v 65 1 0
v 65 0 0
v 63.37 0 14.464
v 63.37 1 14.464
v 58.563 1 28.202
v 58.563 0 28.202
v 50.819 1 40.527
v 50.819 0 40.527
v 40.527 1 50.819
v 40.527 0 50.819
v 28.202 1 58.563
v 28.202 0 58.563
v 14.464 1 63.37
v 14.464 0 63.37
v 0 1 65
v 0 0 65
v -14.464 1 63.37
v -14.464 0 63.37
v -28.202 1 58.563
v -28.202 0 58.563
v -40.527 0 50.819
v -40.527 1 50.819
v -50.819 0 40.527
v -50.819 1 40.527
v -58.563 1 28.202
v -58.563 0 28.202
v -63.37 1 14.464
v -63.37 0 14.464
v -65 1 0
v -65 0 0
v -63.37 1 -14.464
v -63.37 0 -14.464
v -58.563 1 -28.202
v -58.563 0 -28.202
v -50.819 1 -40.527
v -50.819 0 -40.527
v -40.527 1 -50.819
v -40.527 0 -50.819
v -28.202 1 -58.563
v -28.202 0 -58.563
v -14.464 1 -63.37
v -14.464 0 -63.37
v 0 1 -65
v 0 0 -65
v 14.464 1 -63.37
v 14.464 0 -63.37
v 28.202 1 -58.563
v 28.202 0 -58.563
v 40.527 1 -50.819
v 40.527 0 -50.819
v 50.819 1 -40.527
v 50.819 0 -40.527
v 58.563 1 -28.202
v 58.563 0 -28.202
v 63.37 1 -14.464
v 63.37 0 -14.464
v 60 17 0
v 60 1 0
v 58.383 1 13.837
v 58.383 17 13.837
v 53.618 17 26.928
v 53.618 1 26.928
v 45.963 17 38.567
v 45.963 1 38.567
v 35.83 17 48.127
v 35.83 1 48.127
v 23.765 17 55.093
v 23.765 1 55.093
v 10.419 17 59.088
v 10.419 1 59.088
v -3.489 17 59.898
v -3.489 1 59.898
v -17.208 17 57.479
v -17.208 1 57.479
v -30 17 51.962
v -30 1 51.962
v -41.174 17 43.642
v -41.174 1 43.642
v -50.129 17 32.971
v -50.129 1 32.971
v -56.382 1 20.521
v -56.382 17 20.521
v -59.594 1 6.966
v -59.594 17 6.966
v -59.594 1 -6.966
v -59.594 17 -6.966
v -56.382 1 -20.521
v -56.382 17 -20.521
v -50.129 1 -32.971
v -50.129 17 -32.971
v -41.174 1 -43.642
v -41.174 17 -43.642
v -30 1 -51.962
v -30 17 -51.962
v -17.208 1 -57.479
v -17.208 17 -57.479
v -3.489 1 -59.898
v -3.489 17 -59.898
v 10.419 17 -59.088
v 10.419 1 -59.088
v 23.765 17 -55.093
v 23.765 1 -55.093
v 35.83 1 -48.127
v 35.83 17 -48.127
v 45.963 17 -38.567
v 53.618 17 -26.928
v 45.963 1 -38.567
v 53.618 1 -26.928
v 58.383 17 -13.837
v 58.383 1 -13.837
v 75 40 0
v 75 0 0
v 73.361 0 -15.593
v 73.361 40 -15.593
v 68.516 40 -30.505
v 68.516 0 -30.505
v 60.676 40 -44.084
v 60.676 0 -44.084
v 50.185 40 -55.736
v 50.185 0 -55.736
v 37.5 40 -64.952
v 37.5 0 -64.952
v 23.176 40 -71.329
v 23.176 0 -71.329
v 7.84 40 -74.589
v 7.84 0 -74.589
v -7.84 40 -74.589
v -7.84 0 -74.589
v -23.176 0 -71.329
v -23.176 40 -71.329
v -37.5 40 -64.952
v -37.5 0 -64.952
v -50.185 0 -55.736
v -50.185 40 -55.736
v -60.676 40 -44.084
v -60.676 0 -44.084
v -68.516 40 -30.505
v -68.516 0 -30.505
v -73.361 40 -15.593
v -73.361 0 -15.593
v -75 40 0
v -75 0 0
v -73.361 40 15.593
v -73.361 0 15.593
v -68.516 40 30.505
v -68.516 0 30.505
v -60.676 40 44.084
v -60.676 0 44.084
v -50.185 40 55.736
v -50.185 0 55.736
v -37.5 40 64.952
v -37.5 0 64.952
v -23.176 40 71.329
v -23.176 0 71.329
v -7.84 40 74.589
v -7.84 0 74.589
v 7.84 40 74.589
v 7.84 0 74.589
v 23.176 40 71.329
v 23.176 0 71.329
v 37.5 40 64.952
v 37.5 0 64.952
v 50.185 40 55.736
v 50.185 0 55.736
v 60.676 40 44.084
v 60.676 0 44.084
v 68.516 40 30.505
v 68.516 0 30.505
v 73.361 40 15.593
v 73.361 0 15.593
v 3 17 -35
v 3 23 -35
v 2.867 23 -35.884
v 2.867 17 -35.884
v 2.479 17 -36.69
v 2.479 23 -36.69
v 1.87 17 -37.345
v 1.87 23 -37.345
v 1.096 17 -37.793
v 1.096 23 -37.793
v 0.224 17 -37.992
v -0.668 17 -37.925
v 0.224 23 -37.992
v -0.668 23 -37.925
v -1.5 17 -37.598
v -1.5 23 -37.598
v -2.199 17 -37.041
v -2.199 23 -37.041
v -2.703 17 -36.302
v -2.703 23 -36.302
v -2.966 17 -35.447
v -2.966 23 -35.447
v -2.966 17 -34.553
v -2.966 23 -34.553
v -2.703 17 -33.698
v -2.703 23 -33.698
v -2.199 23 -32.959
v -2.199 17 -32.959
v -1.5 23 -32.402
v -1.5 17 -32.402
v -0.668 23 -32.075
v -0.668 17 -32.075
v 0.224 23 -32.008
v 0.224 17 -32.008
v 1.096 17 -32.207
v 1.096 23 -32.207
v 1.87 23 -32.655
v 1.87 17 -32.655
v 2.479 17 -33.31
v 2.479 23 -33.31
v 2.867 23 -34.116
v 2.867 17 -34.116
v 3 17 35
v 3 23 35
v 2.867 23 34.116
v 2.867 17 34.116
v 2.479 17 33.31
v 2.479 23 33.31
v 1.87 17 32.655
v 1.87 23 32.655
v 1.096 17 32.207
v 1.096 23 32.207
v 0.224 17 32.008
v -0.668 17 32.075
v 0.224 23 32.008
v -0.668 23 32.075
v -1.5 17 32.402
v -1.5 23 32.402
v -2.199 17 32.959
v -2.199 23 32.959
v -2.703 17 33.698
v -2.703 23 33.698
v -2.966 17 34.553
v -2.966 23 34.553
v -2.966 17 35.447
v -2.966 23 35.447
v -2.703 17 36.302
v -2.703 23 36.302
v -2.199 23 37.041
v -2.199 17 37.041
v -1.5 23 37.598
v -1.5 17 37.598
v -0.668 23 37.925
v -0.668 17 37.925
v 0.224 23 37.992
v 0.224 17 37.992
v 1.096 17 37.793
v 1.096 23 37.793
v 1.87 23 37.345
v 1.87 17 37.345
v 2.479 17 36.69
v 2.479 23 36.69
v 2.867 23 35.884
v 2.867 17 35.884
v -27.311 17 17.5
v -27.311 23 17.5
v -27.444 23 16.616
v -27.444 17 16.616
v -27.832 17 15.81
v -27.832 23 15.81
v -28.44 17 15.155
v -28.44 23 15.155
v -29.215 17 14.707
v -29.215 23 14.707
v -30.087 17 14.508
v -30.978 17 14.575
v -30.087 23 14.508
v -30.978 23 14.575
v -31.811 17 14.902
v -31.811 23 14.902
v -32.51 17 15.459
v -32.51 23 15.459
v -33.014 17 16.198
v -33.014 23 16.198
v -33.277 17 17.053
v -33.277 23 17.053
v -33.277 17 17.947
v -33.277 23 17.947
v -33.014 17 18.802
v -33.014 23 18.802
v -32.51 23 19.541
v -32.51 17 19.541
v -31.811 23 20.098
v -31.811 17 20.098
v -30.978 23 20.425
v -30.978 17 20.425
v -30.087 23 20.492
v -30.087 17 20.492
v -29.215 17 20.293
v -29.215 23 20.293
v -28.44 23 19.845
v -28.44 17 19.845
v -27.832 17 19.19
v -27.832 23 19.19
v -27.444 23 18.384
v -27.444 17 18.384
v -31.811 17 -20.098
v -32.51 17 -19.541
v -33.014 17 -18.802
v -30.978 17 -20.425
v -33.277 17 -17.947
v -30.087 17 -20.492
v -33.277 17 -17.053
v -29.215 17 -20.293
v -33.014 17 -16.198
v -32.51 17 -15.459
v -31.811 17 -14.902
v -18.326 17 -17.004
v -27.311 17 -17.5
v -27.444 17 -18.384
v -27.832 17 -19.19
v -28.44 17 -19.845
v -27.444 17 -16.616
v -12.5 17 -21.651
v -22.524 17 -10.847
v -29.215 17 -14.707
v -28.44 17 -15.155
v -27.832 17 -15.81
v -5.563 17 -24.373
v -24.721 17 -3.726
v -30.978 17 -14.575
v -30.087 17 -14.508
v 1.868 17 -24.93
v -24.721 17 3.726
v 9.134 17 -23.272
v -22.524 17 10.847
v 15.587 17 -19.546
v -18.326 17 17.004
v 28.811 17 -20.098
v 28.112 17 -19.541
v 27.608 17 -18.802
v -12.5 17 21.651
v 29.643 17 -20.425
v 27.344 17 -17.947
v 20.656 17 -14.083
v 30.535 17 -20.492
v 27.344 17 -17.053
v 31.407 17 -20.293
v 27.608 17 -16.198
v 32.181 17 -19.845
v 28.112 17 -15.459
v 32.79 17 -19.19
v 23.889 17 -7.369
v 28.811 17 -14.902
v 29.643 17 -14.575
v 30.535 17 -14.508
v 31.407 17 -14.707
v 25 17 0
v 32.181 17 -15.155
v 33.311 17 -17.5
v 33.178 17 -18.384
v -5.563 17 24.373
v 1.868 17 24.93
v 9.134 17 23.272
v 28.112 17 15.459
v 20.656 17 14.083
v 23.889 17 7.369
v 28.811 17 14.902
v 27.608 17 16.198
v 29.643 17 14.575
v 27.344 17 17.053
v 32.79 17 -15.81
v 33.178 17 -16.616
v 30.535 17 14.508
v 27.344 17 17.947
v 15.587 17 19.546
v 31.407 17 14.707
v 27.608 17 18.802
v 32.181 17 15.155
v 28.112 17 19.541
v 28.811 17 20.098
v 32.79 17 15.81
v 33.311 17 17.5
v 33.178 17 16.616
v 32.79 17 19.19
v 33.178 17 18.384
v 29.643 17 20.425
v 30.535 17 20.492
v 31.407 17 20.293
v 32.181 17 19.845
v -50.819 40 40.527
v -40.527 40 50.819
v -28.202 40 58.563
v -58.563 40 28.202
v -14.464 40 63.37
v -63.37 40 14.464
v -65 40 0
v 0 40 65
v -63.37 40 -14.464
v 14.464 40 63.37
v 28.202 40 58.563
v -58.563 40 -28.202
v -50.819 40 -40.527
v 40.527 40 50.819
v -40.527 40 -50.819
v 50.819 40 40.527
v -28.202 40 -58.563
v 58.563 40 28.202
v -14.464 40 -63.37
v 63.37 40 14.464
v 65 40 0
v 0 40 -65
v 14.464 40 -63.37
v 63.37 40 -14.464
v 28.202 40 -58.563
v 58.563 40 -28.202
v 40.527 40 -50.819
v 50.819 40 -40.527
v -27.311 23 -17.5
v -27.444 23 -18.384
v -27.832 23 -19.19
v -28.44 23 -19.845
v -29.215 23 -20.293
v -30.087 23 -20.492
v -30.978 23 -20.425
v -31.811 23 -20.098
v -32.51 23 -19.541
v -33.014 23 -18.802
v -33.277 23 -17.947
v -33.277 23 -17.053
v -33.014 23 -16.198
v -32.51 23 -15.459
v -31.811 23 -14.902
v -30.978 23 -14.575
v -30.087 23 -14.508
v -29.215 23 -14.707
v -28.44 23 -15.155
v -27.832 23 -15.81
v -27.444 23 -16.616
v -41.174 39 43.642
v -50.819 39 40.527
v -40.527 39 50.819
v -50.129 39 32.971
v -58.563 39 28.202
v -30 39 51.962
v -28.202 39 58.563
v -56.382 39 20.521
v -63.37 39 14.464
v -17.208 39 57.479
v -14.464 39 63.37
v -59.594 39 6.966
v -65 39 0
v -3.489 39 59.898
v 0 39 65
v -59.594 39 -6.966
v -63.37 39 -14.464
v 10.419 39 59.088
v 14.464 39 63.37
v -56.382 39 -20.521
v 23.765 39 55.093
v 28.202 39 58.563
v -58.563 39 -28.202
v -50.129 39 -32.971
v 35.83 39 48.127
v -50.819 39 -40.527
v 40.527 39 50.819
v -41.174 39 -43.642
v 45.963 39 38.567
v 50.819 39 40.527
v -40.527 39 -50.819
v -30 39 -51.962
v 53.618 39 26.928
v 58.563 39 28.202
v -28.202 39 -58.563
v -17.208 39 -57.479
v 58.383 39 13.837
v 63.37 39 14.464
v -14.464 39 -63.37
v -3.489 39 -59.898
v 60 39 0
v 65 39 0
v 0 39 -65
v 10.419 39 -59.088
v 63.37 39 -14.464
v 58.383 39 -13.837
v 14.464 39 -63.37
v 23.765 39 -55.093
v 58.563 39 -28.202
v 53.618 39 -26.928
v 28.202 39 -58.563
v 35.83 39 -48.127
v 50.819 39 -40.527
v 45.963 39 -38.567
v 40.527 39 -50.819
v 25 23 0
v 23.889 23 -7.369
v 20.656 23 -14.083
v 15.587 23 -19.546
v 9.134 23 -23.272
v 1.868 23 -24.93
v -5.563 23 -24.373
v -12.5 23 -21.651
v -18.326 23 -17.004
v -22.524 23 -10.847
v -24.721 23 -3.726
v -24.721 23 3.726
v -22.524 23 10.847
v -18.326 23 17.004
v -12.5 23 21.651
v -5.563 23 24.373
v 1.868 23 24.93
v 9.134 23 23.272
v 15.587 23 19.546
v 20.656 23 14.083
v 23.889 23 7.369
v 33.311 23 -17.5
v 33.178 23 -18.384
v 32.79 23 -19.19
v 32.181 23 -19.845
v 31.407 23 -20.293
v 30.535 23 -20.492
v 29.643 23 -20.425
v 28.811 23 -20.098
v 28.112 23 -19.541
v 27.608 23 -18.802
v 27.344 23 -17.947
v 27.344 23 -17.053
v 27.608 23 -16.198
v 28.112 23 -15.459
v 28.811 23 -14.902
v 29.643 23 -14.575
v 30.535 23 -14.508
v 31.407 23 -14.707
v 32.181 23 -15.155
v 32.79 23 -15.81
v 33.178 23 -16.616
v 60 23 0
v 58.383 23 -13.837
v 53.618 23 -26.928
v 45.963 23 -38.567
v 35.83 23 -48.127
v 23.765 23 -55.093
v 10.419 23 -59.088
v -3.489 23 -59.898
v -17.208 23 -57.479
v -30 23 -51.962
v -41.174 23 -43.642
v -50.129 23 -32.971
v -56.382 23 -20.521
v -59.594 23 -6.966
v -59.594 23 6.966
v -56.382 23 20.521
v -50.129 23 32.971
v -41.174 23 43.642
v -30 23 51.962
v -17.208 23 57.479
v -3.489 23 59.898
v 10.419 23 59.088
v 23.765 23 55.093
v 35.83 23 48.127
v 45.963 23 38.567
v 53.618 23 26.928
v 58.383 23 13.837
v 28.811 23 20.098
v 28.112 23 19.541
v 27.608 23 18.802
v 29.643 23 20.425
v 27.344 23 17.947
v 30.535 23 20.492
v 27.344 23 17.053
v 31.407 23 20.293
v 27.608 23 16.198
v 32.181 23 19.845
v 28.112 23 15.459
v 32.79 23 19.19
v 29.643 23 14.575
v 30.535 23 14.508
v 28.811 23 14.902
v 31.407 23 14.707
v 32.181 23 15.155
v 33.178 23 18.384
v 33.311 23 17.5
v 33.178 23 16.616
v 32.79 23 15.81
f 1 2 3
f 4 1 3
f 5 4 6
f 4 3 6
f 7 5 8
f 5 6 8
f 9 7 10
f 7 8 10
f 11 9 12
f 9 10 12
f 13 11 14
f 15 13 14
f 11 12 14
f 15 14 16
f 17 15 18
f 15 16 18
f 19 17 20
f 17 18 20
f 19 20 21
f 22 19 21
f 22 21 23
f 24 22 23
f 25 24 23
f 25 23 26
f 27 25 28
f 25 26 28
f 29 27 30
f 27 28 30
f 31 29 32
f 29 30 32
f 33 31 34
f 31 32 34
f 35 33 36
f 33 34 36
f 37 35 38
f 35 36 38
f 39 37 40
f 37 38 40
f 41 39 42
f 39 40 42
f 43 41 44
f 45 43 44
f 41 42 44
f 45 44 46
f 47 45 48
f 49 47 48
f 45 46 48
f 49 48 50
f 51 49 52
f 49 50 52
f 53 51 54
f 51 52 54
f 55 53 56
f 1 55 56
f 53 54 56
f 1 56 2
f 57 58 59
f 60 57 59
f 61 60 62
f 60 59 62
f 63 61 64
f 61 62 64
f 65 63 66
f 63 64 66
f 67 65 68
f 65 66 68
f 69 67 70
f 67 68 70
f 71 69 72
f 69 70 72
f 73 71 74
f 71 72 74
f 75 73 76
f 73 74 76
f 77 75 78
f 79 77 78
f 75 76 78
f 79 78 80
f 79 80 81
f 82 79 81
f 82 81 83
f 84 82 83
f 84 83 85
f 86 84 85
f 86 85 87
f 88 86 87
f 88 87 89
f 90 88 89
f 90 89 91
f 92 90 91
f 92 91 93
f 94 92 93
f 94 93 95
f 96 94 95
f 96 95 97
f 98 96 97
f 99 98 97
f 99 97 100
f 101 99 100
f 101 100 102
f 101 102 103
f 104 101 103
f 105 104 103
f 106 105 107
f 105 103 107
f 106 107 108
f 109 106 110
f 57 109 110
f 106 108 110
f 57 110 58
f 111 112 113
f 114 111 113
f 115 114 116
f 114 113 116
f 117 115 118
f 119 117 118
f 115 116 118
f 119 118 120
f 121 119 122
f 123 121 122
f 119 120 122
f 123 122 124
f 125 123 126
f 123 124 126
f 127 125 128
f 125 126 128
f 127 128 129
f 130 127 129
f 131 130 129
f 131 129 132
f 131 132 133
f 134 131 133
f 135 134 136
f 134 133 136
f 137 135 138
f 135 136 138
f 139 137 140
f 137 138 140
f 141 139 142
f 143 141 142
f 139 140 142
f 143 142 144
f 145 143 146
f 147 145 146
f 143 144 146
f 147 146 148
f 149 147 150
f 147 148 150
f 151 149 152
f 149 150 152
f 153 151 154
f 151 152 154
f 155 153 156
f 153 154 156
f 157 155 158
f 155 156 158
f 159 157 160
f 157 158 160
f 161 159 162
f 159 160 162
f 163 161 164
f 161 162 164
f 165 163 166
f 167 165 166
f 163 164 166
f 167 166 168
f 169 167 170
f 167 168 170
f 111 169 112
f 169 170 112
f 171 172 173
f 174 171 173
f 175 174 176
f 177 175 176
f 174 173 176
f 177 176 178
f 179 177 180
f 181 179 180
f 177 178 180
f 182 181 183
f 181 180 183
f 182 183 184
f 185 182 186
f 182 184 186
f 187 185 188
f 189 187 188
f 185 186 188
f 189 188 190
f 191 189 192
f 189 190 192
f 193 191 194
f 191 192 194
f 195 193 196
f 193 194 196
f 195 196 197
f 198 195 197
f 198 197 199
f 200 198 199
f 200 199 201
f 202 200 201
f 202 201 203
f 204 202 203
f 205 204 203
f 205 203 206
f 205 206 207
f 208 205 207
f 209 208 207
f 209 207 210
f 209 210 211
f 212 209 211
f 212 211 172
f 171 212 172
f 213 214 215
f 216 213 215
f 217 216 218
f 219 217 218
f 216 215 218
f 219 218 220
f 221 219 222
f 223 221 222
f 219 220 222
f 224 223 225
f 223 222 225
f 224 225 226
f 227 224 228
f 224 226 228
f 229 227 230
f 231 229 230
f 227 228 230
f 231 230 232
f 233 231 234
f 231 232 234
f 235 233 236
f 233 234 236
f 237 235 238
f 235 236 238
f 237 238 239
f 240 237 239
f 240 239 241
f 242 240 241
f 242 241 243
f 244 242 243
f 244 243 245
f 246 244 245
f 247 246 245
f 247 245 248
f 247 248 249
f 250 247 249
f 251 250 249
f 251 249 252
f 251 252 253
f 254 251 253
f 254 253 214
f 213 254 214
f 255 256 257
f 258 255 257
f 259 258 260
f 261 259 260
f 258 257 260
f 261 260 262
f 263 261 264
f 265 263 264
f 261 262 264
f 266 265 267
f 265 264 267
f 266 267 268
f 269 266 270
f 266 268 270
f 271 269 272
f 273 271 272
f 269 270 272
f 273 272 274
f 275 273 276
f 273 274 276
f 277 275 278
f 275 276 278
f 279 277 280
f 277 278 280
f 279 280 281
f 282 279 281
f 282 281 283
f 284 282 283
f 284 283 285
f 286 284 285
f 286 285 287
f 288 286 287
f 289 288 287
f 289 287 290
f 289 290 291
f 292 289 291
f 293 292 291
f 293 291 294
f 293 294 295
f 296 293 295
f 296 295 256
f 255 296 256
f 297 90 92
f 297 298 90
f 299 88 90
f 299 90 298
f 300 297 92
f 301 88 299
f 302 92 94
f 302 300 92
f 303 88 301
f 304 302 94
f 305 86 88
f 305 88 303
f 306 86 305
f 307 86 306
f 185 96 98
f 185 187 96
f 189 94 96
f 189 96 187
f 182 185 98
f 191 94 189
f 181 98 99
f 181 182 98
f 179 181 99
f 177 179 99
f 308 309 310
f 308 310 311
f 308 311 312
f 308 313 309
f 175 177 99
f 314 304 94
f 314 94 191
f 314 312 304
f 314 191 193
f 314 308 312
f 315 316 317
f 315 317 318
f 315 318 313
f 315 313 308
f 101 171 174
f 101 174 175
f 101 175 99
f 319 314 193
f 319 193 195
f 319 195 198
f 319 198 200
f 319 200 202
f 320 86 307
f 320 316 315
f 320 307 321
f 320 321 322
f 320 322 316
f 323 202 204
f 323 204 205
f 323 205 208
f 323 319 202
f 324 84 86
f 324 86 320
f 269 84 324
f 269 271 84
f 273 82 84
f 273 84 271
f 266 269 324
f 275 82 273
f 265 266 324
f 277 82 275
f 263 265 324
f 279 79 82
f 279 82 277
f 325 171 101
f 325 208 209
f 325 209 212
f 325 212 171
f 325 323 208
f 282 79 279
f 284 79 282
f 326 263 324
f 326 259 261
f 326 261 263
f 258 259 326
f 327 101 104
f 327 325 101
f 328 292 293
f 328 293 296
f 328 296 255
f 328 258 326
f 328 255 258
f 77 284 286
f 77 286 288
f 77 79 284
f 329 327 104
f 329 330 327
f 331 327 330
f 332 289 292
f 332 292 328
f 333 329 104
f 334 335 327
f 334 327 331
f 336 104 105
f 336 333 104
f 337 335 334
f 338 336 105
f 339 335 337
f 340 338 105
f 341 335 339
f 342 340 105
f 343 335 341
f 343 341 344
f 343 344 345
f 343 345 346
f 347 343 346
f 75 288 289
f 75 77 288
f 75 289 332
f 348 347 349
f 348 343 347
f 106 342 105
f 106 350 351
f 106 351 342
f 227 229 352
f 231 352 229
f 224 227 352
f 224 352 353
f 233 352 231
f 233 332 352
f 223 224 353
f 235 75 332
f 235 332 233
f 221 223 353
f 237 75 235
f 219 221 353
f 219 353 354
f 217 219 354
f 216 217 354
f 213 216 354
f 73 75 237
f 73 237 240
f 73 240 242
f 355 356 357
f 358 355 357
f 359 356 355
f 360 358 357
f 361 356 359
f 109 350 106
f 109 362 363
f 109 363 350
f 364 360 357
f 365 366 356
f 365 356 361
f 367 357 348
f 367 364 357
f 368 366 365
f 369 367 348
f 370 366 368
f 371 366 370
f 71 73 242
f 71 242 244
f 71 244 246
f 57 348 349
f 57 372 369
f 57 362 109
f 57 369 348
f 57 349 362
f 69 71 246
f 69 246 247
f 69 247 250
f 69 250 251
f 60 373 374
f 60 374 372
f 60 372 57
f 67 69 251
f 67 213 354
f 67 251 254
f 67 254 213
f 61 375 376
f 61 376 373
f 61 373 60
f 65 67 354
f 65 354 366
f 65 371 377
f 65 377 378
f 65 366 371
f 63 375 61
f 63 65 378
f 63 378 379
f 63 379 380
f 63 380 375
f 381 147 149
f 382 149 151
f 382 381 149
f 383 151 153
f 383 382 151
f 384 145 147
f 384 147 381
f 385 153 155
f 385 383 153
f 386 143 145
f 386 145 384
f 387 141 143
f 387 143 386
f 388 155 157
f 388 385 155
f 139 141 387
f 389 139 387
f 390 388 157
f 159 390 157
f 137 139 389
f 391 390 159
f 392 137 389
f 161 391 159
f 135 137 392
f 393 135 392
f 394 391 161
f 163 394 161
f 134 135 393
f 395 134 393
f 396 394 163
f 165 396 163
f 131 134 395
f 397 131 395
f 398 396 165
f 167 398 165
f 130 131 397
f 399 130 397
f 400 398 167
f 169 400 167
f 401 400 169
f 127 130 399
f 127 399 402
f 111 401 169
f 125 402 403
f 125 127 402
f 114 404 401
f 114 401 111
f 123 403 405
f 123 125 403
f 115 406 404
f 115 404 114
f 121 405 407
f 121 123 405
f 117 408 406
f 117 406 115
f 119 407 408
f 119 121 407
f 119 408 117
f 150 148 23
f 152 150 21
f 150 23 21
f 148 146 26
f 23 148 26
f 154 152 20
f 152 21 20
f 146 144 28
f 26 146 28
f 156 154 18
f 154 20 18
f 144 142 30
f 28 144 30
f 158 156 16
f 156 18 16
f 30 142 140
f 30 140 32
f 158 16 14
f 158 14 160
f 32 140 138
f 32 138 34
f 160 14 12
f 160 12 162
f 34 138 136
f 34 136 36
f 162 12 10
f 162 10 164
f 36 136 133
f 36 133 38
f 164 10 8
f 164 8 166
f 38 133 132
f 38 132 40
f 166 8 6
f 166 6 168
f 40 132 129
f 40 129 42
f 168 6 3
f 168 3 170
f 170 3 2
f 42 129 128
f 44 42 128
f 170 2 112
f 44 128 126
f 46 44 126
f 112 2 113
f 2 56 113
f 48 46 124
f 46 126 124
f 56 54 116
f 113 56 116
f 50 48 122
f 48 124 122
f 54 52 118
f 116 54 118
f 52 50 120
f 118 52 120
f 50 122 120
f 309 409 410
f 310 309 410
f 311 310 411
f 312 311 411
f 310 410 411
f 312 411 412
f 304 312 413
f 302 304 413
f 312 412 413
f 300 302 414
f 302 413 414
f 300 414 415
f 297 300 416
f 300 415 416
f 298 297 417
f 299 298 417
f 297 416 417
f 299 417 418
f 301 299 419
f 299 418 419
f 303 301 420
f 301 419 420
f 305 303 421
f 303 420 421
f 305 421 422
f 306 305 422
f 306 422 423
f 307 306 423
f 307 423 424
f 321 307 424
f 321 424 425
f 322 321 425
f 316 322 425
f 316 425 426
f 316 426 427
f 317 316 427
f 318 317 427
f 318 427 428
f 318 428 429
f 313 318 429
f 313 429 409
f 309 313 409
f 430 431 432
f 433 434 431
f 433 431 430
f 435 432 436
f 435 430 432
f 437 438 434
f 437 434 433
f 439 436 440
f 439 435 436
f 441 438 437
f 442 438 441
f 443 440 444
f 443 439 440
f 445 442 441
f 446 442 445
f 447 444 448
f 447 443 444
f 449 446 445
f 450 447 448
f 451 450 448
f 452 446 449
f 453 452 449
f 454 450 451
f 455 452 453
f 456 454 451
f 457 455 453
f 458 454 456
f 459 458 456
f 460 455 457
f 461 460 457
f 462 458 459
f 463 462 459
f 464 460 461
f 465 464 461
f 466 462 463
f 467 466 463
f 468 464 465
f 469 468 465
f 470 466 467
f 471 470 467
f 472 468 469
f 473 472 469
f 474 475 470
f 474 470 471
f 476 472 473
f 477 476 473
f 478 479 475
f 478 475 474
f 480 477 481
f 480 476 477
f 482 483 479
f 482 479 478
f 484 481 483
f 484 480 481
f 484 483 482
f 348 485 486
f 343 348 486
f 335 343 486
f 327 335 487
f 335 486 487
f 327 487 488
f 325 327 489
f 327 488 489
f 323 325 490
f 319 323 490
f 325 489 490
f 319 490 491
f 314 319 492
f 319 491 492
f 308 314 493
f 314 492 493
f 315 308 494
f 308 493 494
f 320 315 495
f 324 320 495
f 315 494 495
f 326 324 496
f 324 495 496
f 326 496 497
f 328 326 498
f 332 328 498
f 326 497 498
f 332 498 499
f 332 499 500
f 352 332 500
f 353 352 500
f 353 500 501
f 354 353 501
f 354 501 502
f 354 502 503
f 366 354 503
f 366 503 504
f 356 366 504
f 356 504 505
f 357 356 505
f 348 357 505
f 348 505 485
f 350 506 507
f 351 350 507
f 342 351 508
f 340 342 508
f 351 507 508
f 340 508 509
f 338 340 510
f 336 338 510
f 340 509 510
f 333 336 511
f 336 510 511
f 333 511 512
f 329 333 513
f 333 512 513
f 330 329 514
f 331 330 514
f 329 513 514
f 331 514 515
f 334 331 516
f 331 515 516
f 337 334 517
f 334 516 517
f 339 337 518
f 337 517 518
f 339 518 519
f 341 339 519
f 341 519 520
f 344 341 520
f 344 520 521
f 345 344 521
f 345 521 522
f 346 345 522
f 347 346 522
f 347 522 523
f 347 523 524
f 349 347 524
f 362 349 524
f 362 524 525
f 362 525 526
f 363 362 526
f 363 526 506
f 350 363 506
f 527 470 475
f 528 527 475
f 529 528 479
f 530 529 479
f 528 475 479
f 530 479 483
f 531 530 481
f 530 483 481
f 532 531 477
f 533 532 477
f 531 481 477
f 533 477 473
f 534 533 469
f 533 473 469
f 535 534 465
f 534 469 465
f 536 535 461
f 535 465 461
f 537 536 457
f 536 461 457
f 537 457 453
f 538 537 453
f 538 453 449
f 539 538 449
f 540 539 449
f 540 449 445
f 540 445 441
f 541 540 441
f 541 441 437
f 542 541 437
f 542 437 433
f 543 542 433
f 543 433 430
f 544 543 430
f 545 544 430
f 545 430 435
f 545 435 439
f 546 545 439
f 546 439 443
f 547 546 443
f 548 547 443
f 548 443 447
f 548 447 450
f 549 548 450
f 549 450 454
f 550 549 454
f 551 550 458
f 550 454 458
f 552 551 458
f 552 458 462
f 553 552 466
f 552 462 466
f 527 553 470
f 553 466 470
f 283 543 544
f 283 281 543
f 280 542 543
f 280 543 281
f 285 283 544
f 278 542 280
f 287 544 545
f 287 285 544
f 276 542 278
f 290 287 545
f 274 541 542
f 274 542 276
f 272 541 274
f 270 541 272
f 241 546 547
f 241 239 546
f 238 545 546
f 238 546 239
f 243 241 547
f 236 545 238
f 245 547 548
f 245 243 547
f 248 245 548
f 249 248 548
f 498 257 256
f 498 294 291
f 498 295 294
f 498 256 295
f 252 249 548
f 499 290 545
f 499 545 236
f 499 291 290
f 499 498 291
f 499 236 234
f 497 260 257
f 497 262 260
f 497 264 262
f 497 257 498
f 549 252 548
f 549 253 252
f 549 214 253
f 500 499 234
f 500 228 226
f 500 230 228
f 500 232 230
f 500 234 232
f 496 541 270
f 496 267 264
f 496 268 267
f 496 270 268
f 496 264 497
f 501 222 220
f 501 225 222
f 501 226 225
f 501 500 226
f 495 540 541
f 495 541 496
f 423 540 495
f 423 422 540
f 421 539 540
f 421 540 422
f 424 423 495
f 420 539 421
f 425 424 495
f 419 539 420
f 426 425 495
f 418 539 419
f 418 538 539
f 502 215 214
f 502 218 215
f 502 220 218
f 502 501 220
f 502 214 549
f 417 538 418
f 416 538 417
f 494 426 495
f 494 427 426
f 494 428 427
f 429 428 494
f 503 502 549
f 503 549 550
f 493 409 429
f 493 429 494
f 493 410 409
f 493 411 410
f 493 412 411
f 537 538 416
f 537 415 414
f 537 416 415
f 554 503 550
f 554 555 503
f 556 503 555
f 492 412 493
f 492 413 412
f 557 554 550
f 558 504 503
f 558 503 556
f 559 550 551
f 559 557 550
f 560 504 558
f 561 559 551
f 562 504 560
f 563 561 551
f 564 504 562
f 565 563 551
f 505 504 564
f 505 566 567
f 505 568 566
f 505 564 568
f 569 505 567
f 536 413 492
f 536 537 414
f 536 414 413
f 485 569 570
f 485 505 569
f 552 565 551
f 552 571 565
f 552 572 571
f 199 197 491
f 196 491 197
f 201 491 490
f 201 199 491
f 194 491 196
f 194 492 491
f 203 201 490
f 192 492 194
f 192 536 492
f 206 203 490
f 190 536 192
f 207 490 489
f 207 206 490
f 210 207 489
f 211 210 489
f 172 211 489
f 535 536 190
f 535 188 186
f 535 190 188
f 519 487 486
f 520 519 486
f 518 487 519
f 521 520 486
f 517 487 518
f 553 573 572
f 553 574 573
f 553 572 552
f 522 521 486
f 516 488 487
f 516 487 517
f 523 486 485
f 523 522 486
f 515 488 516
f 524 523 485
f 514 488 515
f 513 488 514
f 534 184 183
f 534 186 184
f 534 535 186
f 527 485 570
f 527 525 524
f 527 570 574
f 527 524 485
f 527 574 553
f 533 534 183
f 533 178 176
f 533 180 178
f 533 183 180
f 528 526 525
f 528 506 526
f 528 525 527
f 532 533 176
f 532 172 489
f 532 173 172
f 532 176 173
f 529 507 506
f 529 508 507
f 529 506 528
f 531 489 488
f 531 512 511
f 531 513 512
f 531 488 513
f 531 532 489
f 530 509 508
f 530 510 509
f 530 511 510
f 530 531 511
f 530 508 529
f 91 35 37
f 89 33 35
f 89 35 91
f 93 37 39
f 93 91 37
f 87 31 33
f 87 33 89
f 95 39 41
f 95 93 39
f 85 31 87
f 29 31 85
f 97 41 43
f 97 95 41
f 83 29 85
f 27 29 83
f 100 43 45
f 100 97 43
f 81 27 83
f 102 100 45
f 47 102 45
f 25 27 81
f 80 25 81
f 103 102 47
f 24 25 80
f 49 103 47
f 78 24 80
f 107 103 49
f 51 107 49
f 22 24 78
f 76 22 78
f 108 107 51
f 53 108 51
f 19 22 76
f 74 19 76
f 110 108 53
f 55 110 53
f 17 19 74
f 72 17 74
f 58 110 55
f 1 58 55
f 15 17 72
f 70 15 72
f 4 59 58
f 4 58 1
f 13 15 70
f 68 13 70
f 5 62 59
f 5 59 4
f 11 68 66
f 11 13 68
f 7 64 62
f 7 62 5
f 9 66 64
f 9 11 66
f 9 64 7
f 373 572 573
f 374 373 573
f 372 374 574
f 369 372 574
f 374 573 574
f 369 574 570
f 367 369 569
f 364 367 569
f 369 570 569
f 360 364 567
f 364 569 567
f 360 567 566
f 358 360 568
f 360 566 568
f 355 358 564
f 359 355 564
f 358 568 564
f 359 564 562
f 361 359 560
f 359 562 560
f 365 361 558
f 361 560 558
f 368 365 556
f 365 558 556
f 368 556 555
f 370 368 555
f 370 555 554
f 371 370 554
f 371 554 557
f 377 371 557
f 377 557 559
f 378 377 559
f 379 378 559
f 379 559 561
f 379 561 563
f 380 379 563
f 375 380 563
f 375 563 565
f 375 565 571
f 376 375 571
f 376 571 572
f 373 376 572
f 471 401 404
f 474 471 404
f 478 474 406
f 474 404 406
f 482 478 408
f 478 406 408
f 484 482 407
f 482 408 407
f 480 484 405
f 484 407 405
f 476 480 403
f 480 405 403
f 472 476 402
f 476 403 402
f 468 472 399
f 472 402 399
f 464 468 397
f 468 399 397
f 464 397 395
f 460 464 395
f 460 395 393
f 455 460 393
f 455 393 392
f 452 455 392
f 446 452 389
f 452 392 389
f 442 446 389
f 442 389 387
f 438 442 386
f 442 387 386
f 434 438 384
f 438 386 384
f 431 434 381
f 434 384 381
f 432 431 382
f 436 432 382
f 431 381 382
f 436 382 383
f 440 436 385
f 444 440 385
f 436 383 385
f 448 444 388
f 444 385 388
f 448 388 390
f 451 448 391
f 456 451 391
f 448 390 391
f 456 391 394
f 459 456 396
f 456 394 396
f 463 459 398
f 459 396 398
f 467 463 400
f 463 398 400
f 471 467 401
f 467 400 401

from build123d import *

# Parameters (mm, degrees)
SKETCH1_R           = 75
BOSS_EXTRUDE1_DEPTH = 40
SKETCH2_R           = 60
CUT_EXTRUDE1_DEPTH  = 17
SKETCH3_R           = 25
CUT_EXTRUDE2_DEPTH  = 24
SKETCH4_R           = 3
CUT_EXTRUDE3_DEPTH  = 24
SKETCH6_R           = 60
CUT_EXTRUDE4_DEPTH  = 17
SKETCH7_R           = 65
CUT_EXTRUDE5_DEPTH  = 1
SKETCH8_R           = 65
CUT_EXTRUDE6_DEPTH  = 1


with BuildPart() as part:
    # Sketch1 → Boss-Extrude1 (new body)
    with BuildSketch(Plane(origin=(0, 0, 0), x_dir=(1, 0, 0), z_dir=(0, 1, 0))):
        Circle(SKETCH1_R)
    extrude(amount=BOSS_EXTRUDE1_DEPTH)

    # Sketch2 → Cut-Extrude1 (cut)
    with BuildSketch(Plane(origin=(0, 40, 0), x_dir=(1, 0, 0), z_dir=(0, 1, 0))):
        Circle(SKETCH2_R)
    extrude(amount=-CUT_EXTRUDE1_DEPTH, mode=Mode.SUBTRACT)

    # Sketch3 → Cut-Extrude2 (cut, through all)
    with BuildSketch(Plane(origin=(0, 23, 0), x_dir=(1, 0, 0), z_dir=(0, 1, 0))):
        Circle(SKETCH3_R)
    extrude(amount=-CUT_EXTRUDE2_DEPTH, mode=Mode.SUBTRACT)

    # Sketch4 → Cut-Extrude3 (cut, through all)
    with BuildSketch(Plane(origin=(0, 23, 0), x_dir=(1, 0, 0), z_dir=(0, 1, 0))):
        with Locations((0, 35)):
            Circle(SKETCH4_R)
        with Locations((30.310889132, 17.5)):
            Circle(SKETCH4_R)
        with Locations((30.310889132, -17.5)):
            Circle(SKETCH4_R)
        with Locations((0, -35)):
            Circle(SKETCH4_R)
        with Locations((-30.310889132, -17.5)):
            Circle(SKETCH4_R)
        with Locations((-30.310889132, 17.5)):
            Circle(SKETCH4_R)
    extrude(amount=-CUT_EXTRUDE3_DEPTH, mode=Mode.SUBTRACT)

    # Sketch6 → Cut-Extrude4 (cut)
    with BuildSketch(Plane.XZ):
        Circle(SKETCH6_R)
    extrude(amount=-CUT_EXTRUDE4_DEPTH, mode=Mode.SUBTRACT)

    # Sketch7 → Cut-Extrude5 (cut)
    with BuildSketch(Plane.XZ):
        Circle(SKETCH7_R)
    extrude(amount=-CUT_EXTRUDE5_DEPTH, mode=Mode.SUBTRACT)

    # Sketch8 → Cut-Extrude6 (cut)
    with BuildSketch(Plane(origin=(0, 40, 0), x_dir=(1, 0, 0), z_dir=(0, 1, 0))):
        Circle(SKETCH8_R)
    extrude(amount=-CUT_EXTRUDE6_DEPTH, mode=Mode.SUBTRACT)


solid = part.part
